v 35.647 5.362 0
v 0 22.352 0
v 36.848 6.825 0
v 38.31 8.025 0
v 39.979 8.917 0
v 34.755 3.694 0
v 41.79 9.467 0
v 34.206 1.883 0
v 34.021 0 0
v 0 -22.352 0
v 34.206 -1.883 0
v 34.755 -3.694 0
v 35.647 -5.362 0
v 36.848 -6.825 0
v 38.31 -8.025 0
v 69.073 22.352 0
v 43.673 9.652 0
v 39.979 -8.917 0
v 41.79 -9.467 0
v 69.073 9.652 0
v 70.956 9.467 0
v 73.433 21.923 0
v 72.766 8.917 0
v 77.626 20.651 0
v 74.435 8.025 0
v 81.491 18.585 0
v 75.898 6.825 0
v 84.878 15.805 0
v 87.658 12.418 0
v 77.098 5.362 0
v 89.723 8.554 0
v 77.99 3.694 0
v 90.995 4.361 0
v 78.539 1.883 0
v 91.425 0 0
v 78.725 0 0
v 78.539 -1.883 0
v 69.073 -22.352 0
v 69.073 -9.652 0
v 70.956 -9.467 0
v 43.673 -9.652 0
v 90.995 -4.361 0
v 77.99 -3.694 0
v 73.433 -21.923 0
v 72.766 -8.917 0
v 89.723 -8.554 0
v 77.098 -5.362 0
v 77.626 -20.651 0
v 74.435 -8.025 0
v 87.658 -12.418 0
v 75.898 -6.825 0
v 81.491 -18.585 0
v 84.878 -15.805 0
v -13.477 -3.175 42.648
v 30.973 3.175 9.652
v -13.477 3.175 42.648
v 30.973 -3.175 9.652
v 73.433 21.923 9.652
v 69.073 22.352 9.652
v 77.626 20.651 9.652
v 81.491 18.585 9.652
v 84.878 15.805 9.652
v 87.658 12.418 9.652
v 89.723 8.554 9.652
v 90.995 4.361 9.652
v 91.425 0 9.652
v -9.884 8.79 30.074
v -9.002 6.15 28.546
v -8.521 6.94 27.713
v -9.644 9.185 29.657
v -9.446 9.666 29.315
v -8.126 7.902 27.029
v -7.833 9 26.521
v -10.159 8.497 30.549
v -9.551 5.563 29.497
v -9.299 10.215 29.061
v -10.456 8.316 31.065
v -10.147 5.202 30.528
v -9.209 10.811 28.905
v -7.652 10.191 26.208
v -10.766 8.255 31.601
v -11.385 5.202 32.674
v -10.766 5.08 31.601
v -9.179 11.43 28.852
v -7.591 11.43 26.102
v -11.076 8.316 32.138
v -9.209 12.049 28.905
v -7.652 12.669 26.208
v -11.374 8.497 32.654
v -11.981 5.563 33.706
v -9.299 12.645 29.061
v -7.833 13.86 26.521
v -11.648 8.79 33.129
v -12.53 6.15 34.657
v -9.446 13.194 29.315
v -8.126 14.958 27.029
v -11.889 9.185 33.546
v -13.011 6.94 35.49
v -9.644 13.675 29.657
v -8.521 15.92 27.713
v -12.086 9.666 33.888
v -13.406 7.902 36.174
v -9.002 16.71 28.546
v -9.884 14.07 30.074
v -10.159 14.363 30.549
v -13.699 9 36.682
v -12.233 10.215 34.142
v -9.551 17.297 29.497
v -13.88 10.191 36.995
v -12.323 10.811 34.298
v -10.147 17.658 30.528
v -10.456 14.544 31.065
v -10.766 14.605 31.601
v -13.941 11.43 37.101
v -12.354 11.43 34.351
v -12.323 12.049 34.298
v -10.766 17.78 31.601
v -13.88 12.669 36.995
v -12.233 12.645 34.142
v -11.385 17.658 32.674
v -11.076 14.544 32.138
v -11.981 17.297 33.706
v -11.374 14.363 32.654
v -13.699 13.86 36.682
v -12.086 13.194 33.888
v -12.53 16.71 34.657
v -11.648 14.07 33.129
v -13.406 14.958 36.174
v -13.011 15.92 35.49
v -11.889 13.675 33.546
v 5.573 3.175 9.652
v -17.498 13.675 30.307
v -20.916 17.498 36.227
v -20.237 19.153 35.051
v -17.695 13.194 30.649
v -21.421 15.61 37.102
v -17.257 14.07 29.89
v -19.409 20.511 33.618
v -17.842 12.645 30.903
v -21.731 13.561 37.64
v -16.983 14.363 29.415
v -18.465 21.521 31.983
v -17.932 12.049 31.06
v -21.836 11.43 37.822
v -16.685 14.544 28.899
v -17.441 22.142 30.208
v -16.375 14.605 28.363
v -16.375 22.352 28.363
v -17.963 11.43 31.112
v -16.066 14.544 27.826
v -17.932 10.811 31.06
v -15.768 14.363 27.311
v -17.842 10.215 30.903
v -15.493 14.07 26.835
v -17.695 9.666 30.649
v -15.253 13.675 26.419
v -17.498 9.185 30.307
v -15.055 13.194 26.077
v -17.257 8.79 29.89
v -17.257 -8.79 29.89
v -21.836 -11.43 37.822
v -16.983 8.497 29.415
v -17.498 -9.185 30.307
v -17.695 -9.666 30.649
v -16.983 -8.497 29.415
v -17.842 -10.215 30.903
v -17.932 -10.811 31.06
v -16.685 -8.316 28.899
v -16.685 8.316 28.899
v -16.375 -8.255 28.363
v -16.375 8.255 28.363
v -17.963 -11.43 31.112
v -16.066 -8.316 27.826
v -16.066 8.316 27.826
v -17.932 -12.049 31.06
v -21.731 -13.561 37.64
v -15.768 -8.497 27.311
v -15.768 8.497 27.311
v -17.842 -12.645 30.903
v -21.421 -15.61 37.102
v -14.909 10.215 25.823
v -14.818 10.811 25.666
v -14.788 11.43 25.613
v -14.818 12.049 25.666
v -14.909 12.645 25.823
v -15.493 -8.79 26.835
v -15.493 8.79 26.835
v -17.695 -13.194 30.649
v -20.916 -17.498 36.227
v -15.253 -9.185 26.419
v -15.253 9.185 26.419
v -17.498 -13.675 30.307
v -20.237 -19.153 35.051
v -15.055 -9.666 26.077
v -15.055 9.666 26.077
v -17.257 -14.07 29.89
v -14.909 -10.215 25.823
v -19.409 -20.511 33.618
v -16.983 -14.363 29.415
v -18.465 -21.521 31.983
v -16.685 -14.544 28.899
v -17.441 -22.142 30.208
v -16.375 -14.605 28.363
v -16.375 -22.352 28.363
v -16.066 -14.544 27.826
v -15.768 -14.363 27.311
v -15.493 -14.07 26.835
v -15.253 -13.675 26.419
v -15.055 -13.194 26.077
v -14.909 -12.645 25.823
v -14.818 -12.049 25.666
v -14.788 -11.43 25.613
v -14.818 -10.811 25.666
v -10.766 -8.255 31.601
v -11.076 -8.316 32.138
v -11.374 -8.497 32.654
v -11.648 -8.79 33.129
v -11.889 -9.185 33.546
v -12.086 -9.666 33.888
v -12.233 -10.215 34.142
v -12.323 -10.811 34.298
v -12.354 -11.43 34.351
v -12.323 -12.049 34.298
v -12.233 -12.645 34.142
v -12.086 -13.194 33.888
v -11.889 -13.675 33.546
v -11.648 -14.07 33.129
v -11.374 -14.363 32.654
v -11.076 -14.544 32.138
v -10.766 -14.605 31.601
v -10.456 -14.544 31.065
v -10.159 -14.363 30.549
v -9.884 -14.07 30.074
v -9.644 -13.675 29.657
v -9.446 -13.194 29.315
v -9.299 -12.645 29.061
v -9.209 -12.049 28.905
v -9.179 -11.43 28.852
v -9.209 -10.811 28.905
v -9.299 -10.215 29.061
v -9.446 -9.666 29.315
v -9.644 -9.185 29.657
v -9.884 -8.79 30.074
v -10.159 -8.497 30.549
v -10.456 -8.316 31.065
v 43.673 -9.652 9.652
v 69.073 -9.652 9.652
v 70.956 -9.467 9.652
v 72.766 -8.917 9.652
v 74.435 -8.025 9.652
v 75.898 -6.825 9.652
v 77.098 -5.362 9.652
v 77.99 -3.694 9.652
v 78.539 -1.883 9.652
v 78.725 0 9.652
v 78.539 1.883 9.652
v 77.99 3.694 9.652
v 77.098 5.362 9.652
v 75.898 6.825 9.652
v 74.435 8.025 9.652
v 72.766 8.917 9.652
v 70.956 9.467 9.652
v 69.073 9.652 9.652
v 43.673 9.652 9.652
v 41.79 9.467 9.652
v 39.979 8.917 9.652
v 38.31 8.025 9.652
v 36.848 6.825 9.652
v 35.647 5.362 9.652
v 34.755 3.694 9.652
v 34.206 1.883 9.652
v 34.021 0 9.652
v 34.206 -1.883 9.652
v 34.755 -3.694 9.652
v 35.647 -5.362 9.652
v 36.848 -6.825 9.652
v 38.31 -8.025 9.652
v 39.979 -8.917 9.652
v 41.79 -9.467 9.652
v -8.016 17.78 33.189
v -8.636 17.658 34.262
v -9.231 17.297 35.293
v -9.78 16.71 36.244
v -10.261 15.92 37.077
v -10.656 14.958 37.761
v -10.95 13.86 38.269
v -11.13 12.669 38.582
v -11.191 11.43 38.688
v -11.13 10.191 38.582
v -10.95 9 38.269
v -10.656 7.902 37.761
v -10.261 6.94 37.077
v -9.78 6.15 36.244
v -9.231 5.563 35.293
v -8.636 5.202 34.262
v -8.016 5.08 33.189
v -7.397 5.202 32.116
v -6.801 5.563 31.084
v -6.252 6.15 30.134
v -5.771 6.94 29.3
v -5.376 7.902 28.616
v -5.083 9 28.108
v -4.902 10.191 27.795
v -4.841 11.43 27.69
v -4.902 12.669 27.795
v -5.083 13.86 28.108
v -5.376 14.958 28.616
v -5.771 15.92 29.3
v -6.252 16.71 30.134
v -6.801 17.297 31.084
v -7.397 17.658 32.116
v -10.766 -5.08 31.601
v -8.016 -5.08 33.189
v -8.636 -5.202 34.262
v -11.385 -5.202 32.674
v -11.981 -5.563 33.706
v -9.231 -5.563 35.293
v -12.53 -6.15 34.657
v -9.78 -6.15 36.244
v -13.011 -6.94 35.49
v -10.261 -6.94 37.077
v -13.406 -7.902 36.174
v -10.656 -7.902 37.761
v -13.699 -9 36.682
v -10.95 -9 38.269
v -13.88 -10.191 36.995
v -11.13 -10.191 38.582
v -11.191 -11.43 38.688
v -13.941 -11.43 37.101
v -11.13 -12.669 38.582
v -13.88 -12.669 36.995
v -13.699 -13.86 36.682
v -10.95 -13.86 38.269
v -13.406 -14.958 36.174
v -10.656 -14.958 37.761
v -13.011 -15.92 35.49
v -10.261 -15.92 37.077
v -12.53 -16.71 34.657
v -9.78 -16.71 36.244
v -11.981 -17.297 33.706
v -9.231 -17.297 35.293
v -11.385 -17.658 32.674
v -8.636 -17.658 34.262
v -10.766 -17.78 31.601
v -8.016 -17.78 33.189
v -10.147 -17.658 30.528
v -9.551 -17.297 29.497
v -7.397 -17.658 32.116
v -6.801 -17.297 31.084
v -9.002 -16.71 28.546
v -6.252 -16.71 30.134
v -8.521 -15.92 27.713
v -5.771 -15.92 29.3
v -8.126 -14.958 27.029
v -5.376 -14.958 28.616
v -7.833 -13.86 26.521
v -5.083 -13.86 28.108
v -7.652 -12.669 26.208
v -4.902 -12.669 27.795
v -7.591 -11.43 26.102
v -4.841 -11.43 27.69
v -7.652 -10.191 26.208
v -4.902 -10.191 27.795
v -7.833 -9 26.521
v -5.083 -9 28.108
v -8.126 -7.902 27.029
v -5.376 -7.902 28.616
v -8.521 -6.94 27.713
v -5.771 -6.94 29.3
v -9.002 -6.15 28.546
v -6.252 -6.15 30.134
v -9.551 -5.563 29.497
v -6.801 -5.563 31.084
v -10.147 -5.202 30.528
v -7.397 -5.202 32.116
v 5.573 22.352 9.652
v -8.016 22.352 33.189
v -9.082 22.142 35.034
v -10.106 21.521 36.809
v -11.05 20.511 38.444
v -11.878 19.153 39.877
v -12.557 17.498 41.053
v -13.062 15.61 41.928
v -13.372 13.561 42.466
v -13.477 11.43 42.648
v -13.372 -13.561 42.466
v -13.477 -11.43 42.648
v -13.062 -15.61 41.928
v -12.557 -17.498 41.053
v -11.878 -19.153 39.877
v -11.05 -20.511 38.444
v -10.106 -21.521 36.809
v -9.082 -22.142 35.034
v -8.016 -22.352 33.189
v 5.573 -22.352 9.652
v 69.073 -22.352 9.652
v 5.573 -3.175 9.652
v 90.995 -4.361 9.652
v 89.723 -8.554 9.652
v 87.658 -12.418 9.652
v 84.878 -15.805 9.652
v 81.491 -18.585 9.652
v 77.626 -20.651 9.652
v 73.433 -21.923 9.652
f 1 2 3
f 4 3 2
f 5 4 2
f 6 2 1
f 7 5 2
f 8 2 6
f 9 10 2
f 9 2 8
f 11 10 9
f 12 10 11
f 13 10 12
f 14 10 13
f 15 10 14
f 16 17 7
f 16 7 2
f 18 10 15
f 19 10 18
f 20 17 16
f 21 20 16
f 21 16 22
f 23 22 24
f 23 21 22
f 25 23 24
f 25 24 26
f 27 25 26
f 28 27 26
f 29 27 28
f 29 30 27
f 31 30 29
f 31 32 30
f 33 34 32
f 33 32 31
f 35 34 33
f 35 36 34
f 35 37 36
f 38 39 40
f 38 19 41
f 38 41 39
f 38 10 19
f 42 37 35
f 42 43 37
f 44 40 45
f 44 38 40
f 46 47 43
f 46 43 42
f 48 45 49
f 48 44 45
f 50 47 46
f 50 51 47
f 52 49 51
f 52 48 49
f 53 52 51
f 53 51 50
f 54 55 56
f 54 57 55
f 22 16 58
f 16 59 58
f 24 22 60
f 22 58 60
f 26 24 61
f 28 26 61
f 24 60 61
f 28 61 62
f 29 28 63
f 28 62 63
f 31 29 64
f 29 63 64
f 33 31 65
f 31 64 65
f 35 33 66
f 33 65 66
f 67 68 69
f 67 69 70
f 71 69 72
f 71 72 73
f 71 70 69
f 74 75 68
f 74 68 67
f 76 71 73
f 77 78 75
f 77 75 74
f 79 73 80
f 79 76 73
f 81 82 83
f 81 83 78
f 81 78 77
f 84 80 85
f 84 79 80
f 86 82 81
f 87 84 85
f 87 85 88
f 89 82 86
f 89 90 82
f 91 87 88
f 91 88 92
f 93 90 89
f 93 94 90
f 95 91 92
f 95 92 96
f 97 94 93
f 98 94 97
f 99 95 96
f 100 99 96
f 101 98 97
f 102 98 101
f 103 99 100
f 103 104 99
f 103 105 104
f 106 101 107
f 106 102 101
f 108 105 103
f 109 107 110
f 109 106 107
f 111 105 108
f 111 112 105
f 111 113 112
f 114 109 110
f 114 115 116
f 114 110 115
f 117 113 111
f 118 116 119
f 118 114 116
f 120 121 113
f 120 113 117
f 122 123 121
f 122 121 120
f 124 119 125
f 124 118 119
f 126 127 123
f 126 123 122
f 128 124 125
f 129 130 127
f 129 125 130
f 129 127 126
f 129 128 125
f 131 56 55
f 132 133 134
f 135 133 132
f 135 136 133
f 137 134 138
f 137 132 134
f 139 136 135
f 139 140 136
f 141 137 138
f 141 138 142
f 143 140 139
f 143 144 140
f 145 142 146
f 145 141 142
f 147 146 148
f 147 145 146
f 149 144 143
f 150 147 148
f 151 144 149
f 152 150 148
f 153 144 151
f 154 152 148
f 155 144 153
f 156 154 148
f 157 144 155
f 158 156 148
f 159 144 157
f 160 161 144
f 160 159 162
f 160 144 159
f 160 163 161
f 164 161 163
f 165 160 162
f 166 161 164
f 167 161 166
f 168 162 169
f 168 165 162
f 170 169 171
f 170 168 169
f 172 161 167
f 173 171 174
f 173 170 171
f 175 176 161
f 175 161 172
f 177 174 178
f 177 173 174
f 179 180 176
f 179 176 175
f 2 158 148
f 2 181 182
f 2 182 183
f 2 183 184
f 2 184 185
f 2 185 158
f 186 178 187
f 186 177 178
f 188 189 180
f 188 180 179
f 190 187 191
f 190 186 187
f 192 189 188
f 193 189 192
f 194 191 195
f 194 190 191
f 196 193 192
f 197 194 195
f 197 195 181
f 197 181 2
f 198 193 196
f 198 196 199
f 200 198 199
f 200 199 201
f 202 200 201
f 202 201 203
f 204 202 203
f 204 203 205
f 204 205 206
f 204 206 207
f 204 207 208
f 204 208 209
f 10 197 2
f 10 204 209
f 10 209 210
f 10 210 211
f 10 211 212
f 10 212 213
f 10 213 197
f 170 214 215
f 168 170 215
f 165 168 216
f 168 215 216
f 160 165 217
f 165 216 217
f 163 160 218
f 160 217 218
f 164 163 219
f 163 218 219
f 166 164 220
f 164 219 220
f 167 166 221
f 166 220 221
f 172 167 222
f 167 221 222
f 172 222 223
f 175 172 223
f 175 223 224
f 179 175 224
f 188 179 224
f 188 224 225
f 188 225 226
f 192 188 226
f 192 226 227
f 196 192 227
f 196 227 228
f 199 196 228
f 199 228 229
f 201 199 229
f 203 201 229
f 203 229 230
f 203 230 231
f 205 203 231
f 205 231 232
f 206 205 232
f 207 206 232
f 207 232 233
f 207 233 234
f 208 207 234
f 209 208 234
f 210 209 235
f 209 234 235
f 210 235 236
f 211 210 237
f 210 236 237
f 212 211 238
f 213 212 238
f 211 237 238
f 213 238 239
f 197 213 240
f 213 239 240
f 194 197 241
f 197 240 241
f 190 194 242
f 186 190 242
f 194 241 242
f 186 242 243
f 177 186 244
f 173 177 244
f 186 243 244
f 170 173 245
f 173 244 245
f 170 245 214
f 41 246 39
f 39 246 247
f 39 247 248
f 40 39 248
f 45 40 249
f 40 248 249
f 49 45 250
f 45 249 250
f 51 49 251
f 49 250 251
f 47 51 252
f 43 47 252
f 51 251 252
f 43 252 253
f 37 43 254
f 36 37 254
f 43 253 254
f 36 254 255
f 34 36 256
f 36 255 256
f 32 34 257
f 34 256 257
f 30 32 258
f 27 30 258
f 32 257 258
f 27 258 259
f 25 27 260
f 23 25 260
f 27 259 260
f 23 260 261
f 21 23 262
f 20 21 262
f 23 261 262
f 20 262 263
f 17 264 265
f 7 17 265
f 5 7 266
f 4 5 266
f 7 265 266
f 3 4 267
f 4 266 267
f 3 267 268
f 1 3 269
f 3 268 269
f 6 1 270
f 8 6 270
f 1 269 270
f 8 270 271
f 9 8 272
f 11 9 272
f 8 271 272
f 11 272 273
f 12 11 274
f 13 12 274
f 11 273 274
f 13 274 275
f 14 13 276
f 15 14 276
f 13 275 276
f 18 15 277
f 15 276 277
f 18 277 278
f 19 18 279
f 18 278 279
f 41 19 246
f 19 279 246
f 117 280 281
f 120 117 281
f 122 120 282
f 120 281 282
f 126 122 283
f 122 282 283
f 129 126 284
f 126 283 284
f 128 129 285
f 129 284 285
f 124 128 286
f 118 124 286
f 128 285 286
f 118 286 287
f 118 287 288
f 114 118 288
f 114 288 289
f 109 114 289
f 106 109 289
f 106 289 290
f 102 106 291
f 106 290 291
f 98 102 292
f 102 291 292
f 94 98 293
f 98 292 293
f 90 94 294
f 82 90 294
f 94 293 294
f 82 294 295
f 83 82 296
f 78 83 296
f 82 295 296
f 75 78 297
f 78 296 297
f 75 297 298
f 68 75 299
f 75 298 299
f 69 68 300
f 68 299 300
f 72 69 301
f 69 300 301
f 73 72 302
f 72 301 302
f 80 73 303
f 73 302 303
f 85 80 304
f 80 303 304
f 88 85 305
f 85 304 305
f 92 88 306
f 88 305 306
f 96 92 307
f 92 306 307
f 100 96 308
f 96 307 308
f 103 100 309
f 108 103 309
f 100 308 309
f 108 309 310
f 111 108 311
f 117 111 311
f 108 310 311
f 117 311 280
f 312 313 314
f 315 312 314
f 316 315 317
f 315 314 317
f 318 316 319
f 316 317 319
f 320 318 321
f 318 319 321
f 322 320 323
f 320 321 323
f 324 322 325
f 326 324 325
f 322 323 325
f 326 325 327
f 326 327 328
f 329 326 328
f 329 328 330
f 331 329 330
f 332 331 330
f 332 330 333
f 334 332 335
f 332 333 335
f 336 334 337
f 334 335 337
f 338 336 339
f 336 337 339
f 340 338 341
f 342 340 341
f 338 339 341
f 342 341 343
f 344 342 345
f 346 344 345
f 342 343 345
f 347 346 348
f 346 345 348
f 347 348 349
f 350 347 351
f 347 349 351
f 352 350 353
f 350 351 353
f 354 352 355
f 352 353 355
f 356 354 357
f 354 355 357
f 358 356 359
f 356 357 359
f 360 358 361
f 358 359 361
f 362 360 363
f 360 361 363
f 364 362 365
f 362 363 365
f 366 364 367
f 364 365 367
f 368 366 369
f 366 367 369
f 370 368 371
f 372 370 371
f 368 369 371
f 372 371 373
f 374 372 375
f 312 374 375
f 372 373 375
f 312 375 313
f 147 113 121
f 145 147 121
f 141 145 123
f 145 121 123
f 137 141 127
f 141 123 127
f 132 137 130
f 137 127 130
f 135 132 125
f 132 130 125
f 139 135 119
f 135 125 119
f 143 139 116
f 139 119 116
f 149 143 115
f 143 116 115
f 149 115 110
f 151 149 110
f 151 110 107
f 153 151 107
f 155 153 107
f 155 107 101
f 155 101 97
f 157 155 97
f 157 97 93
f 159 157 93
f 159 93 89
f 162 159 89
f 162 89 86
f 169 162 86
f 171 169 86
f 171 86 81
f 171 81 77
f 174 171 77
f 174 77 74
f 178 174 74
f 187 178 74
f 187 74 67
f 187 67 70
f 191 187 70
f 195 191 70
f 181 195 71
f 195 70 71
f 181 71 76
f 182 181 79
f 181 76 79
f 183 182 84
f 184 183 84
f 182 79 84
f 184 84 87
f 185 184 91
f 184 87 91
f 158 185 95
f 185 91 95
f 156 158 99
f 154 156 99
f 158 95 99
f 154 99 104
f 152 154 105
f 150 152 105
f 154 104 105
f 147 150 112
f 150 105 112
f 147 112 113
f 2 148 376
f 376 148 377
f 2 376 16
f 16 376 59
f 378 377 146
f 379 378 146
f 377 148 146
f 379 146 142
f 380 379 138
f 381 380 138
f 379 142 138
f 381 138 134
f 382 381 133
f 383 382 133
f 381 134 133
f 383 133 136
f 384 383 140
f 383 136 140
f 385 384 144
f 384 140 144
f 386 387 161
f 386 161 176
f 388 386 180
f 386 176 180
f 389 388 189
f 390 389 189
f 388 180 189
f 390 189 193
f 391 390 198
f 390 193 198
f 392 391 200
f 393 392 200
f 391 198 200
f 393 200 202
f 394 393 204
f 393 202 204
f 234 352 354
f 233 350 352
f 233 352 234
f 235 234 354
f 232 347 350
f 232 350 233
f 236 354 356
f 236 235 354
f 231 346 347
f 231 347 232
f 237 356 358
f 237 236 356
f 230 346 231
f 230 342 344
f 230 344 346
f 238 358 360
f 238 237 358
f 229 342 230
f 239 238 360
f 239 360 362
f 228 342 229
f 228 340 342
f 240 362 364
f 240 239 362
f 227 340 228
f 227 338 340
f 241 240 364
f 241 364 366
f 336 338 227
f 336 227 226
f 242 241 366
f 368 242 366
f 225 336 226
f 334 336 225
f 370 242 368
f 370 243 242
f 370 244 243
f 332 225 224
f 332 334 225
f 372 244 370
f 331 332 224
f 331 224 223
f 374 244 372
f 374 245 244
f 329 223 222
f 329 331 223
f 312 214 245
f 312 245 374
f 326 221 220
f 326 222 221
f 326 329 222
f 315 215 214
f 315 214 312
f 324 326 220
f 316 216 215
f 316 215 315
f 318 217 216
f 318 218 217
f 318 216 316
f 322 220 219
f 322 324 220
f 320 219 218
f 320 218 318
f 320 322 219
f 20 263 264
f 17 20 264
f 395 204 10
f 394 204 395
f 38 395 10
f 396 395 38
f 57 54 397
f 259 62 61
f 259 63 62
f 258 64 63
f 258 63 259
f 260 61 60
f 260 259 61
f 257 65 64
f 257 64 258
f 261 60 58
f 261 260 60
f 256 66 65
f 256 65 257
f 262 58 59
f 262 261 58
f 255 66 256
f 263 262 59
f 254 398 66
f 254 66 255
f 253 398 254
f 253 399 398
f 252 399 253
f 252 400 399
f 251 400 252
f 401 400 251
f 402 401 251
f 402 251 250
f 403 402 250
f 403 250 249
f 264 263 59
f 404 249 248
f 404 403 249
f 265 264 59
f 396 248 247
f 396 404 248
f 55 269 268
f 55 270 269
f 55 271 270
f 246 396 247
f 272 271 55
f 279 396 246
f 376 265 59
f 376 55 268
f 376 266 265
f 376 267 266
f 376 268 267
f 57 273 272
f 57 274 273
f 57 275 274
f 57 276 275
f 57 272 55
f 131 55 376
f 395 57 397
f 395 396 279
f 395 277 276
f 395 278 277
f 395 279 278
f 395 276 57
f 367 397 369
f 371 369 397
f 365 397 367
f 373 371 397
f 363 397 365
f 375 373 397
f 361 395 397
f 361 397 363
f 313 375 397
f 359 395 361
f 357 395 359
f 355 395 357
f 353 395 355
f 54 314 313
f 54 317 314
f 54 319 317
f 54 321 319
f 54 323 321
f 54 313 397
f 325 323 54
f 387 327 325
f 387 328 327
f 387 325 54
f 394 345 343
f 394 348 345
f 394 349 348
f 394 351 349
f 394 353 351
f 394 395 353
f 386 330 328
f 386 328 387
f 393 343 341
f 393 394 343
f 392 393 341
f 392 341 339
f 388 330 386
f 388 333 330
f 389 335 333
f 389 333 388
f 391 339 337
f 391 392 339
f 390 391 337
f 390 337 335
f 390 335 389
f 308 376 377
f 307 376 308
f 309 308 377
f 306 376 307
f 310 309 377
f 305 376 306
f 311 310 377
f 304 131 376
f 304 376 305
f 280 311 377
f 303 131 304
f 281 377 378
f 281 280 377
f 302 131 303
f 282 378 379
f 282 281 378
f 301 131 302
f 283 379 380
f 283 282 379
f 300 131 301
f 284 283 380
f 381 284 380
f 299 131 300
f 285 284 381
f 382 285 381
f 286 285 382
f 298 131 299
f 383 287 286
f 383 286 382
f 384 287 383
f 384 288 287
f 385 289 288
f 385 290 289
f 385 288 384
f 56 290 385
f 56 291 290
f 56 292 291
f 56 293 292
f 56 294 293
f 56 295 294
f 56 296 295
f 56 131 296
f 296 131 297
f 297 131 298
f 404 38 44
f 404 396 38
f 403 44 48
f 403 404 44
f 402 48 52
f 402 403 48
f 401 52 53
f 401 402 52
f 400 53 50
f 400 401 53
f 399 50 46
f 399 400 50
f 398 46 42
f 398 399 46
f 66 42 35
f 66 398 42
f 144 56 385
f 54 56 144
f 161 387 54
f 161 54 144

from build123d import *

# Parameters (mm, degrees)
F1_DEPTH = 22.352
F2_DEPTH = 3.175
F3_R     = 22.35199
F5_DEPTH = 9.652
F7_R     = 3.175
F8_DEPTH = 25.4
F7_R_2   = 6.35
F9_DEPTH = 3.175
F10_R    = 10.922


# Not quite as in the source:
# - a fillet or chamfer is up to 0.001 mm smaller than in the source, because OpenCascade refuses the exact size


with BuildPart() as f1:
    # F0 (on Front) → F1 (new body, symmetric)
    with BuildSketch(Plane.XZ):
        Polygon((-21.8362923991, 37.8215678842), (0, 0), (91.4245847982, 0), (91.4245847982, 9.652), (30.9725847982, 9.652), (5.5725847982, 9.652), (-13.4774152018, 42.6475678842), align=None)
    extrude(amount=F1_DEPTH, both=True)

    # F0 (on Front) → F2 (join, symmetric)
    with BuildSketch(Plane.XZ):
        Polygon((30.9725847982, 9.652), (-13.4774152018, 42.6475678842), (5.5725847982, 9.652), align=None)
    extrude(amount=F2_DEPTH, both=True)

    # F3 (radius 22.352 in the source; OpenCascade refuses exactly that, so slightly less here)
    f3_edges = [f1.edges().sort_by_distance(p)[0] for p in [
        (91.424585, 22.352, 4.826),
        (91.424585, -22.352, 4.826),
    ]]
    fillet(f3_edges, radius=F3_R)

    # F4 (on face) → F5 (cut, through all)
    with BuildSketch(Plane.XY.offset(9.652)):
        with BuildLine():
            Line((69.0725847982, 9.652), (43.6725847982, 9.652))
            ThreePointArc((43.6725847982, 9.652), (34.0205847982, 0), (43.6725847982, -9.652))
            Line((43.6725847982, -9.652), (69.0725847982, -9.652))
            ThreePointArc((69.0725847982, -9.652), (78.7245847982, 0), (69.0725847982, 9.652))
        make_face()
    extrude(amount=-F5_DEPTH, mode=Mode.SUBTRACT)

    # F7 (on face) → F8 (cut)
    with BuildSketch(Plane(origin=(8.3588771973, 0, 4.826), x_dir=(0, 1, 0), z_dir=(0.8660254038, 0, 0.5))):
        with Locations((11.43, 32.7505847982)):
            Circle(F7_R)
        with Locations((-11.43, 32.7505847982)):
            Circle(F7_R)
    extrude(amount=-F8_DEPTH, mode=Mode.SUBTRACT)

    # F7 (on face) → F9 (cut)
    with BuildSketch(Plane(origin=(8.3588771973, 0, 4.826), x_dir=(0, 1, 0), z_dir=(0.8660254038, 0, 0.5))):
        with Locations((-11.43, 32.7505847982)):
            Circle(F7_R_2)
        with Locations((-11.43, 32.7505847982)):
            Circle(F7_R, mode=Mode.SUBTRACT)
        with Locations((11.43, 32.7505847982)):
            Circle(F7_R_2)
        with Locations((11.43, 32.7505847982)):
            Circle(F7_R, mode=Mode.SUBTRACT)
    extrude(amount=-F9_DEPTH, mode=Mode.SUBTRACT)

    # F10
    f10_edges = [f1.edges().sort_by_distance(p)[0] for p in [
        (-17.656854, 22.352, 40.234568),
        (-17.656854, -22.352, 40.234568),
    ]]
    fillet(f10_edges, radius=F10_R)


solid = f1.part
